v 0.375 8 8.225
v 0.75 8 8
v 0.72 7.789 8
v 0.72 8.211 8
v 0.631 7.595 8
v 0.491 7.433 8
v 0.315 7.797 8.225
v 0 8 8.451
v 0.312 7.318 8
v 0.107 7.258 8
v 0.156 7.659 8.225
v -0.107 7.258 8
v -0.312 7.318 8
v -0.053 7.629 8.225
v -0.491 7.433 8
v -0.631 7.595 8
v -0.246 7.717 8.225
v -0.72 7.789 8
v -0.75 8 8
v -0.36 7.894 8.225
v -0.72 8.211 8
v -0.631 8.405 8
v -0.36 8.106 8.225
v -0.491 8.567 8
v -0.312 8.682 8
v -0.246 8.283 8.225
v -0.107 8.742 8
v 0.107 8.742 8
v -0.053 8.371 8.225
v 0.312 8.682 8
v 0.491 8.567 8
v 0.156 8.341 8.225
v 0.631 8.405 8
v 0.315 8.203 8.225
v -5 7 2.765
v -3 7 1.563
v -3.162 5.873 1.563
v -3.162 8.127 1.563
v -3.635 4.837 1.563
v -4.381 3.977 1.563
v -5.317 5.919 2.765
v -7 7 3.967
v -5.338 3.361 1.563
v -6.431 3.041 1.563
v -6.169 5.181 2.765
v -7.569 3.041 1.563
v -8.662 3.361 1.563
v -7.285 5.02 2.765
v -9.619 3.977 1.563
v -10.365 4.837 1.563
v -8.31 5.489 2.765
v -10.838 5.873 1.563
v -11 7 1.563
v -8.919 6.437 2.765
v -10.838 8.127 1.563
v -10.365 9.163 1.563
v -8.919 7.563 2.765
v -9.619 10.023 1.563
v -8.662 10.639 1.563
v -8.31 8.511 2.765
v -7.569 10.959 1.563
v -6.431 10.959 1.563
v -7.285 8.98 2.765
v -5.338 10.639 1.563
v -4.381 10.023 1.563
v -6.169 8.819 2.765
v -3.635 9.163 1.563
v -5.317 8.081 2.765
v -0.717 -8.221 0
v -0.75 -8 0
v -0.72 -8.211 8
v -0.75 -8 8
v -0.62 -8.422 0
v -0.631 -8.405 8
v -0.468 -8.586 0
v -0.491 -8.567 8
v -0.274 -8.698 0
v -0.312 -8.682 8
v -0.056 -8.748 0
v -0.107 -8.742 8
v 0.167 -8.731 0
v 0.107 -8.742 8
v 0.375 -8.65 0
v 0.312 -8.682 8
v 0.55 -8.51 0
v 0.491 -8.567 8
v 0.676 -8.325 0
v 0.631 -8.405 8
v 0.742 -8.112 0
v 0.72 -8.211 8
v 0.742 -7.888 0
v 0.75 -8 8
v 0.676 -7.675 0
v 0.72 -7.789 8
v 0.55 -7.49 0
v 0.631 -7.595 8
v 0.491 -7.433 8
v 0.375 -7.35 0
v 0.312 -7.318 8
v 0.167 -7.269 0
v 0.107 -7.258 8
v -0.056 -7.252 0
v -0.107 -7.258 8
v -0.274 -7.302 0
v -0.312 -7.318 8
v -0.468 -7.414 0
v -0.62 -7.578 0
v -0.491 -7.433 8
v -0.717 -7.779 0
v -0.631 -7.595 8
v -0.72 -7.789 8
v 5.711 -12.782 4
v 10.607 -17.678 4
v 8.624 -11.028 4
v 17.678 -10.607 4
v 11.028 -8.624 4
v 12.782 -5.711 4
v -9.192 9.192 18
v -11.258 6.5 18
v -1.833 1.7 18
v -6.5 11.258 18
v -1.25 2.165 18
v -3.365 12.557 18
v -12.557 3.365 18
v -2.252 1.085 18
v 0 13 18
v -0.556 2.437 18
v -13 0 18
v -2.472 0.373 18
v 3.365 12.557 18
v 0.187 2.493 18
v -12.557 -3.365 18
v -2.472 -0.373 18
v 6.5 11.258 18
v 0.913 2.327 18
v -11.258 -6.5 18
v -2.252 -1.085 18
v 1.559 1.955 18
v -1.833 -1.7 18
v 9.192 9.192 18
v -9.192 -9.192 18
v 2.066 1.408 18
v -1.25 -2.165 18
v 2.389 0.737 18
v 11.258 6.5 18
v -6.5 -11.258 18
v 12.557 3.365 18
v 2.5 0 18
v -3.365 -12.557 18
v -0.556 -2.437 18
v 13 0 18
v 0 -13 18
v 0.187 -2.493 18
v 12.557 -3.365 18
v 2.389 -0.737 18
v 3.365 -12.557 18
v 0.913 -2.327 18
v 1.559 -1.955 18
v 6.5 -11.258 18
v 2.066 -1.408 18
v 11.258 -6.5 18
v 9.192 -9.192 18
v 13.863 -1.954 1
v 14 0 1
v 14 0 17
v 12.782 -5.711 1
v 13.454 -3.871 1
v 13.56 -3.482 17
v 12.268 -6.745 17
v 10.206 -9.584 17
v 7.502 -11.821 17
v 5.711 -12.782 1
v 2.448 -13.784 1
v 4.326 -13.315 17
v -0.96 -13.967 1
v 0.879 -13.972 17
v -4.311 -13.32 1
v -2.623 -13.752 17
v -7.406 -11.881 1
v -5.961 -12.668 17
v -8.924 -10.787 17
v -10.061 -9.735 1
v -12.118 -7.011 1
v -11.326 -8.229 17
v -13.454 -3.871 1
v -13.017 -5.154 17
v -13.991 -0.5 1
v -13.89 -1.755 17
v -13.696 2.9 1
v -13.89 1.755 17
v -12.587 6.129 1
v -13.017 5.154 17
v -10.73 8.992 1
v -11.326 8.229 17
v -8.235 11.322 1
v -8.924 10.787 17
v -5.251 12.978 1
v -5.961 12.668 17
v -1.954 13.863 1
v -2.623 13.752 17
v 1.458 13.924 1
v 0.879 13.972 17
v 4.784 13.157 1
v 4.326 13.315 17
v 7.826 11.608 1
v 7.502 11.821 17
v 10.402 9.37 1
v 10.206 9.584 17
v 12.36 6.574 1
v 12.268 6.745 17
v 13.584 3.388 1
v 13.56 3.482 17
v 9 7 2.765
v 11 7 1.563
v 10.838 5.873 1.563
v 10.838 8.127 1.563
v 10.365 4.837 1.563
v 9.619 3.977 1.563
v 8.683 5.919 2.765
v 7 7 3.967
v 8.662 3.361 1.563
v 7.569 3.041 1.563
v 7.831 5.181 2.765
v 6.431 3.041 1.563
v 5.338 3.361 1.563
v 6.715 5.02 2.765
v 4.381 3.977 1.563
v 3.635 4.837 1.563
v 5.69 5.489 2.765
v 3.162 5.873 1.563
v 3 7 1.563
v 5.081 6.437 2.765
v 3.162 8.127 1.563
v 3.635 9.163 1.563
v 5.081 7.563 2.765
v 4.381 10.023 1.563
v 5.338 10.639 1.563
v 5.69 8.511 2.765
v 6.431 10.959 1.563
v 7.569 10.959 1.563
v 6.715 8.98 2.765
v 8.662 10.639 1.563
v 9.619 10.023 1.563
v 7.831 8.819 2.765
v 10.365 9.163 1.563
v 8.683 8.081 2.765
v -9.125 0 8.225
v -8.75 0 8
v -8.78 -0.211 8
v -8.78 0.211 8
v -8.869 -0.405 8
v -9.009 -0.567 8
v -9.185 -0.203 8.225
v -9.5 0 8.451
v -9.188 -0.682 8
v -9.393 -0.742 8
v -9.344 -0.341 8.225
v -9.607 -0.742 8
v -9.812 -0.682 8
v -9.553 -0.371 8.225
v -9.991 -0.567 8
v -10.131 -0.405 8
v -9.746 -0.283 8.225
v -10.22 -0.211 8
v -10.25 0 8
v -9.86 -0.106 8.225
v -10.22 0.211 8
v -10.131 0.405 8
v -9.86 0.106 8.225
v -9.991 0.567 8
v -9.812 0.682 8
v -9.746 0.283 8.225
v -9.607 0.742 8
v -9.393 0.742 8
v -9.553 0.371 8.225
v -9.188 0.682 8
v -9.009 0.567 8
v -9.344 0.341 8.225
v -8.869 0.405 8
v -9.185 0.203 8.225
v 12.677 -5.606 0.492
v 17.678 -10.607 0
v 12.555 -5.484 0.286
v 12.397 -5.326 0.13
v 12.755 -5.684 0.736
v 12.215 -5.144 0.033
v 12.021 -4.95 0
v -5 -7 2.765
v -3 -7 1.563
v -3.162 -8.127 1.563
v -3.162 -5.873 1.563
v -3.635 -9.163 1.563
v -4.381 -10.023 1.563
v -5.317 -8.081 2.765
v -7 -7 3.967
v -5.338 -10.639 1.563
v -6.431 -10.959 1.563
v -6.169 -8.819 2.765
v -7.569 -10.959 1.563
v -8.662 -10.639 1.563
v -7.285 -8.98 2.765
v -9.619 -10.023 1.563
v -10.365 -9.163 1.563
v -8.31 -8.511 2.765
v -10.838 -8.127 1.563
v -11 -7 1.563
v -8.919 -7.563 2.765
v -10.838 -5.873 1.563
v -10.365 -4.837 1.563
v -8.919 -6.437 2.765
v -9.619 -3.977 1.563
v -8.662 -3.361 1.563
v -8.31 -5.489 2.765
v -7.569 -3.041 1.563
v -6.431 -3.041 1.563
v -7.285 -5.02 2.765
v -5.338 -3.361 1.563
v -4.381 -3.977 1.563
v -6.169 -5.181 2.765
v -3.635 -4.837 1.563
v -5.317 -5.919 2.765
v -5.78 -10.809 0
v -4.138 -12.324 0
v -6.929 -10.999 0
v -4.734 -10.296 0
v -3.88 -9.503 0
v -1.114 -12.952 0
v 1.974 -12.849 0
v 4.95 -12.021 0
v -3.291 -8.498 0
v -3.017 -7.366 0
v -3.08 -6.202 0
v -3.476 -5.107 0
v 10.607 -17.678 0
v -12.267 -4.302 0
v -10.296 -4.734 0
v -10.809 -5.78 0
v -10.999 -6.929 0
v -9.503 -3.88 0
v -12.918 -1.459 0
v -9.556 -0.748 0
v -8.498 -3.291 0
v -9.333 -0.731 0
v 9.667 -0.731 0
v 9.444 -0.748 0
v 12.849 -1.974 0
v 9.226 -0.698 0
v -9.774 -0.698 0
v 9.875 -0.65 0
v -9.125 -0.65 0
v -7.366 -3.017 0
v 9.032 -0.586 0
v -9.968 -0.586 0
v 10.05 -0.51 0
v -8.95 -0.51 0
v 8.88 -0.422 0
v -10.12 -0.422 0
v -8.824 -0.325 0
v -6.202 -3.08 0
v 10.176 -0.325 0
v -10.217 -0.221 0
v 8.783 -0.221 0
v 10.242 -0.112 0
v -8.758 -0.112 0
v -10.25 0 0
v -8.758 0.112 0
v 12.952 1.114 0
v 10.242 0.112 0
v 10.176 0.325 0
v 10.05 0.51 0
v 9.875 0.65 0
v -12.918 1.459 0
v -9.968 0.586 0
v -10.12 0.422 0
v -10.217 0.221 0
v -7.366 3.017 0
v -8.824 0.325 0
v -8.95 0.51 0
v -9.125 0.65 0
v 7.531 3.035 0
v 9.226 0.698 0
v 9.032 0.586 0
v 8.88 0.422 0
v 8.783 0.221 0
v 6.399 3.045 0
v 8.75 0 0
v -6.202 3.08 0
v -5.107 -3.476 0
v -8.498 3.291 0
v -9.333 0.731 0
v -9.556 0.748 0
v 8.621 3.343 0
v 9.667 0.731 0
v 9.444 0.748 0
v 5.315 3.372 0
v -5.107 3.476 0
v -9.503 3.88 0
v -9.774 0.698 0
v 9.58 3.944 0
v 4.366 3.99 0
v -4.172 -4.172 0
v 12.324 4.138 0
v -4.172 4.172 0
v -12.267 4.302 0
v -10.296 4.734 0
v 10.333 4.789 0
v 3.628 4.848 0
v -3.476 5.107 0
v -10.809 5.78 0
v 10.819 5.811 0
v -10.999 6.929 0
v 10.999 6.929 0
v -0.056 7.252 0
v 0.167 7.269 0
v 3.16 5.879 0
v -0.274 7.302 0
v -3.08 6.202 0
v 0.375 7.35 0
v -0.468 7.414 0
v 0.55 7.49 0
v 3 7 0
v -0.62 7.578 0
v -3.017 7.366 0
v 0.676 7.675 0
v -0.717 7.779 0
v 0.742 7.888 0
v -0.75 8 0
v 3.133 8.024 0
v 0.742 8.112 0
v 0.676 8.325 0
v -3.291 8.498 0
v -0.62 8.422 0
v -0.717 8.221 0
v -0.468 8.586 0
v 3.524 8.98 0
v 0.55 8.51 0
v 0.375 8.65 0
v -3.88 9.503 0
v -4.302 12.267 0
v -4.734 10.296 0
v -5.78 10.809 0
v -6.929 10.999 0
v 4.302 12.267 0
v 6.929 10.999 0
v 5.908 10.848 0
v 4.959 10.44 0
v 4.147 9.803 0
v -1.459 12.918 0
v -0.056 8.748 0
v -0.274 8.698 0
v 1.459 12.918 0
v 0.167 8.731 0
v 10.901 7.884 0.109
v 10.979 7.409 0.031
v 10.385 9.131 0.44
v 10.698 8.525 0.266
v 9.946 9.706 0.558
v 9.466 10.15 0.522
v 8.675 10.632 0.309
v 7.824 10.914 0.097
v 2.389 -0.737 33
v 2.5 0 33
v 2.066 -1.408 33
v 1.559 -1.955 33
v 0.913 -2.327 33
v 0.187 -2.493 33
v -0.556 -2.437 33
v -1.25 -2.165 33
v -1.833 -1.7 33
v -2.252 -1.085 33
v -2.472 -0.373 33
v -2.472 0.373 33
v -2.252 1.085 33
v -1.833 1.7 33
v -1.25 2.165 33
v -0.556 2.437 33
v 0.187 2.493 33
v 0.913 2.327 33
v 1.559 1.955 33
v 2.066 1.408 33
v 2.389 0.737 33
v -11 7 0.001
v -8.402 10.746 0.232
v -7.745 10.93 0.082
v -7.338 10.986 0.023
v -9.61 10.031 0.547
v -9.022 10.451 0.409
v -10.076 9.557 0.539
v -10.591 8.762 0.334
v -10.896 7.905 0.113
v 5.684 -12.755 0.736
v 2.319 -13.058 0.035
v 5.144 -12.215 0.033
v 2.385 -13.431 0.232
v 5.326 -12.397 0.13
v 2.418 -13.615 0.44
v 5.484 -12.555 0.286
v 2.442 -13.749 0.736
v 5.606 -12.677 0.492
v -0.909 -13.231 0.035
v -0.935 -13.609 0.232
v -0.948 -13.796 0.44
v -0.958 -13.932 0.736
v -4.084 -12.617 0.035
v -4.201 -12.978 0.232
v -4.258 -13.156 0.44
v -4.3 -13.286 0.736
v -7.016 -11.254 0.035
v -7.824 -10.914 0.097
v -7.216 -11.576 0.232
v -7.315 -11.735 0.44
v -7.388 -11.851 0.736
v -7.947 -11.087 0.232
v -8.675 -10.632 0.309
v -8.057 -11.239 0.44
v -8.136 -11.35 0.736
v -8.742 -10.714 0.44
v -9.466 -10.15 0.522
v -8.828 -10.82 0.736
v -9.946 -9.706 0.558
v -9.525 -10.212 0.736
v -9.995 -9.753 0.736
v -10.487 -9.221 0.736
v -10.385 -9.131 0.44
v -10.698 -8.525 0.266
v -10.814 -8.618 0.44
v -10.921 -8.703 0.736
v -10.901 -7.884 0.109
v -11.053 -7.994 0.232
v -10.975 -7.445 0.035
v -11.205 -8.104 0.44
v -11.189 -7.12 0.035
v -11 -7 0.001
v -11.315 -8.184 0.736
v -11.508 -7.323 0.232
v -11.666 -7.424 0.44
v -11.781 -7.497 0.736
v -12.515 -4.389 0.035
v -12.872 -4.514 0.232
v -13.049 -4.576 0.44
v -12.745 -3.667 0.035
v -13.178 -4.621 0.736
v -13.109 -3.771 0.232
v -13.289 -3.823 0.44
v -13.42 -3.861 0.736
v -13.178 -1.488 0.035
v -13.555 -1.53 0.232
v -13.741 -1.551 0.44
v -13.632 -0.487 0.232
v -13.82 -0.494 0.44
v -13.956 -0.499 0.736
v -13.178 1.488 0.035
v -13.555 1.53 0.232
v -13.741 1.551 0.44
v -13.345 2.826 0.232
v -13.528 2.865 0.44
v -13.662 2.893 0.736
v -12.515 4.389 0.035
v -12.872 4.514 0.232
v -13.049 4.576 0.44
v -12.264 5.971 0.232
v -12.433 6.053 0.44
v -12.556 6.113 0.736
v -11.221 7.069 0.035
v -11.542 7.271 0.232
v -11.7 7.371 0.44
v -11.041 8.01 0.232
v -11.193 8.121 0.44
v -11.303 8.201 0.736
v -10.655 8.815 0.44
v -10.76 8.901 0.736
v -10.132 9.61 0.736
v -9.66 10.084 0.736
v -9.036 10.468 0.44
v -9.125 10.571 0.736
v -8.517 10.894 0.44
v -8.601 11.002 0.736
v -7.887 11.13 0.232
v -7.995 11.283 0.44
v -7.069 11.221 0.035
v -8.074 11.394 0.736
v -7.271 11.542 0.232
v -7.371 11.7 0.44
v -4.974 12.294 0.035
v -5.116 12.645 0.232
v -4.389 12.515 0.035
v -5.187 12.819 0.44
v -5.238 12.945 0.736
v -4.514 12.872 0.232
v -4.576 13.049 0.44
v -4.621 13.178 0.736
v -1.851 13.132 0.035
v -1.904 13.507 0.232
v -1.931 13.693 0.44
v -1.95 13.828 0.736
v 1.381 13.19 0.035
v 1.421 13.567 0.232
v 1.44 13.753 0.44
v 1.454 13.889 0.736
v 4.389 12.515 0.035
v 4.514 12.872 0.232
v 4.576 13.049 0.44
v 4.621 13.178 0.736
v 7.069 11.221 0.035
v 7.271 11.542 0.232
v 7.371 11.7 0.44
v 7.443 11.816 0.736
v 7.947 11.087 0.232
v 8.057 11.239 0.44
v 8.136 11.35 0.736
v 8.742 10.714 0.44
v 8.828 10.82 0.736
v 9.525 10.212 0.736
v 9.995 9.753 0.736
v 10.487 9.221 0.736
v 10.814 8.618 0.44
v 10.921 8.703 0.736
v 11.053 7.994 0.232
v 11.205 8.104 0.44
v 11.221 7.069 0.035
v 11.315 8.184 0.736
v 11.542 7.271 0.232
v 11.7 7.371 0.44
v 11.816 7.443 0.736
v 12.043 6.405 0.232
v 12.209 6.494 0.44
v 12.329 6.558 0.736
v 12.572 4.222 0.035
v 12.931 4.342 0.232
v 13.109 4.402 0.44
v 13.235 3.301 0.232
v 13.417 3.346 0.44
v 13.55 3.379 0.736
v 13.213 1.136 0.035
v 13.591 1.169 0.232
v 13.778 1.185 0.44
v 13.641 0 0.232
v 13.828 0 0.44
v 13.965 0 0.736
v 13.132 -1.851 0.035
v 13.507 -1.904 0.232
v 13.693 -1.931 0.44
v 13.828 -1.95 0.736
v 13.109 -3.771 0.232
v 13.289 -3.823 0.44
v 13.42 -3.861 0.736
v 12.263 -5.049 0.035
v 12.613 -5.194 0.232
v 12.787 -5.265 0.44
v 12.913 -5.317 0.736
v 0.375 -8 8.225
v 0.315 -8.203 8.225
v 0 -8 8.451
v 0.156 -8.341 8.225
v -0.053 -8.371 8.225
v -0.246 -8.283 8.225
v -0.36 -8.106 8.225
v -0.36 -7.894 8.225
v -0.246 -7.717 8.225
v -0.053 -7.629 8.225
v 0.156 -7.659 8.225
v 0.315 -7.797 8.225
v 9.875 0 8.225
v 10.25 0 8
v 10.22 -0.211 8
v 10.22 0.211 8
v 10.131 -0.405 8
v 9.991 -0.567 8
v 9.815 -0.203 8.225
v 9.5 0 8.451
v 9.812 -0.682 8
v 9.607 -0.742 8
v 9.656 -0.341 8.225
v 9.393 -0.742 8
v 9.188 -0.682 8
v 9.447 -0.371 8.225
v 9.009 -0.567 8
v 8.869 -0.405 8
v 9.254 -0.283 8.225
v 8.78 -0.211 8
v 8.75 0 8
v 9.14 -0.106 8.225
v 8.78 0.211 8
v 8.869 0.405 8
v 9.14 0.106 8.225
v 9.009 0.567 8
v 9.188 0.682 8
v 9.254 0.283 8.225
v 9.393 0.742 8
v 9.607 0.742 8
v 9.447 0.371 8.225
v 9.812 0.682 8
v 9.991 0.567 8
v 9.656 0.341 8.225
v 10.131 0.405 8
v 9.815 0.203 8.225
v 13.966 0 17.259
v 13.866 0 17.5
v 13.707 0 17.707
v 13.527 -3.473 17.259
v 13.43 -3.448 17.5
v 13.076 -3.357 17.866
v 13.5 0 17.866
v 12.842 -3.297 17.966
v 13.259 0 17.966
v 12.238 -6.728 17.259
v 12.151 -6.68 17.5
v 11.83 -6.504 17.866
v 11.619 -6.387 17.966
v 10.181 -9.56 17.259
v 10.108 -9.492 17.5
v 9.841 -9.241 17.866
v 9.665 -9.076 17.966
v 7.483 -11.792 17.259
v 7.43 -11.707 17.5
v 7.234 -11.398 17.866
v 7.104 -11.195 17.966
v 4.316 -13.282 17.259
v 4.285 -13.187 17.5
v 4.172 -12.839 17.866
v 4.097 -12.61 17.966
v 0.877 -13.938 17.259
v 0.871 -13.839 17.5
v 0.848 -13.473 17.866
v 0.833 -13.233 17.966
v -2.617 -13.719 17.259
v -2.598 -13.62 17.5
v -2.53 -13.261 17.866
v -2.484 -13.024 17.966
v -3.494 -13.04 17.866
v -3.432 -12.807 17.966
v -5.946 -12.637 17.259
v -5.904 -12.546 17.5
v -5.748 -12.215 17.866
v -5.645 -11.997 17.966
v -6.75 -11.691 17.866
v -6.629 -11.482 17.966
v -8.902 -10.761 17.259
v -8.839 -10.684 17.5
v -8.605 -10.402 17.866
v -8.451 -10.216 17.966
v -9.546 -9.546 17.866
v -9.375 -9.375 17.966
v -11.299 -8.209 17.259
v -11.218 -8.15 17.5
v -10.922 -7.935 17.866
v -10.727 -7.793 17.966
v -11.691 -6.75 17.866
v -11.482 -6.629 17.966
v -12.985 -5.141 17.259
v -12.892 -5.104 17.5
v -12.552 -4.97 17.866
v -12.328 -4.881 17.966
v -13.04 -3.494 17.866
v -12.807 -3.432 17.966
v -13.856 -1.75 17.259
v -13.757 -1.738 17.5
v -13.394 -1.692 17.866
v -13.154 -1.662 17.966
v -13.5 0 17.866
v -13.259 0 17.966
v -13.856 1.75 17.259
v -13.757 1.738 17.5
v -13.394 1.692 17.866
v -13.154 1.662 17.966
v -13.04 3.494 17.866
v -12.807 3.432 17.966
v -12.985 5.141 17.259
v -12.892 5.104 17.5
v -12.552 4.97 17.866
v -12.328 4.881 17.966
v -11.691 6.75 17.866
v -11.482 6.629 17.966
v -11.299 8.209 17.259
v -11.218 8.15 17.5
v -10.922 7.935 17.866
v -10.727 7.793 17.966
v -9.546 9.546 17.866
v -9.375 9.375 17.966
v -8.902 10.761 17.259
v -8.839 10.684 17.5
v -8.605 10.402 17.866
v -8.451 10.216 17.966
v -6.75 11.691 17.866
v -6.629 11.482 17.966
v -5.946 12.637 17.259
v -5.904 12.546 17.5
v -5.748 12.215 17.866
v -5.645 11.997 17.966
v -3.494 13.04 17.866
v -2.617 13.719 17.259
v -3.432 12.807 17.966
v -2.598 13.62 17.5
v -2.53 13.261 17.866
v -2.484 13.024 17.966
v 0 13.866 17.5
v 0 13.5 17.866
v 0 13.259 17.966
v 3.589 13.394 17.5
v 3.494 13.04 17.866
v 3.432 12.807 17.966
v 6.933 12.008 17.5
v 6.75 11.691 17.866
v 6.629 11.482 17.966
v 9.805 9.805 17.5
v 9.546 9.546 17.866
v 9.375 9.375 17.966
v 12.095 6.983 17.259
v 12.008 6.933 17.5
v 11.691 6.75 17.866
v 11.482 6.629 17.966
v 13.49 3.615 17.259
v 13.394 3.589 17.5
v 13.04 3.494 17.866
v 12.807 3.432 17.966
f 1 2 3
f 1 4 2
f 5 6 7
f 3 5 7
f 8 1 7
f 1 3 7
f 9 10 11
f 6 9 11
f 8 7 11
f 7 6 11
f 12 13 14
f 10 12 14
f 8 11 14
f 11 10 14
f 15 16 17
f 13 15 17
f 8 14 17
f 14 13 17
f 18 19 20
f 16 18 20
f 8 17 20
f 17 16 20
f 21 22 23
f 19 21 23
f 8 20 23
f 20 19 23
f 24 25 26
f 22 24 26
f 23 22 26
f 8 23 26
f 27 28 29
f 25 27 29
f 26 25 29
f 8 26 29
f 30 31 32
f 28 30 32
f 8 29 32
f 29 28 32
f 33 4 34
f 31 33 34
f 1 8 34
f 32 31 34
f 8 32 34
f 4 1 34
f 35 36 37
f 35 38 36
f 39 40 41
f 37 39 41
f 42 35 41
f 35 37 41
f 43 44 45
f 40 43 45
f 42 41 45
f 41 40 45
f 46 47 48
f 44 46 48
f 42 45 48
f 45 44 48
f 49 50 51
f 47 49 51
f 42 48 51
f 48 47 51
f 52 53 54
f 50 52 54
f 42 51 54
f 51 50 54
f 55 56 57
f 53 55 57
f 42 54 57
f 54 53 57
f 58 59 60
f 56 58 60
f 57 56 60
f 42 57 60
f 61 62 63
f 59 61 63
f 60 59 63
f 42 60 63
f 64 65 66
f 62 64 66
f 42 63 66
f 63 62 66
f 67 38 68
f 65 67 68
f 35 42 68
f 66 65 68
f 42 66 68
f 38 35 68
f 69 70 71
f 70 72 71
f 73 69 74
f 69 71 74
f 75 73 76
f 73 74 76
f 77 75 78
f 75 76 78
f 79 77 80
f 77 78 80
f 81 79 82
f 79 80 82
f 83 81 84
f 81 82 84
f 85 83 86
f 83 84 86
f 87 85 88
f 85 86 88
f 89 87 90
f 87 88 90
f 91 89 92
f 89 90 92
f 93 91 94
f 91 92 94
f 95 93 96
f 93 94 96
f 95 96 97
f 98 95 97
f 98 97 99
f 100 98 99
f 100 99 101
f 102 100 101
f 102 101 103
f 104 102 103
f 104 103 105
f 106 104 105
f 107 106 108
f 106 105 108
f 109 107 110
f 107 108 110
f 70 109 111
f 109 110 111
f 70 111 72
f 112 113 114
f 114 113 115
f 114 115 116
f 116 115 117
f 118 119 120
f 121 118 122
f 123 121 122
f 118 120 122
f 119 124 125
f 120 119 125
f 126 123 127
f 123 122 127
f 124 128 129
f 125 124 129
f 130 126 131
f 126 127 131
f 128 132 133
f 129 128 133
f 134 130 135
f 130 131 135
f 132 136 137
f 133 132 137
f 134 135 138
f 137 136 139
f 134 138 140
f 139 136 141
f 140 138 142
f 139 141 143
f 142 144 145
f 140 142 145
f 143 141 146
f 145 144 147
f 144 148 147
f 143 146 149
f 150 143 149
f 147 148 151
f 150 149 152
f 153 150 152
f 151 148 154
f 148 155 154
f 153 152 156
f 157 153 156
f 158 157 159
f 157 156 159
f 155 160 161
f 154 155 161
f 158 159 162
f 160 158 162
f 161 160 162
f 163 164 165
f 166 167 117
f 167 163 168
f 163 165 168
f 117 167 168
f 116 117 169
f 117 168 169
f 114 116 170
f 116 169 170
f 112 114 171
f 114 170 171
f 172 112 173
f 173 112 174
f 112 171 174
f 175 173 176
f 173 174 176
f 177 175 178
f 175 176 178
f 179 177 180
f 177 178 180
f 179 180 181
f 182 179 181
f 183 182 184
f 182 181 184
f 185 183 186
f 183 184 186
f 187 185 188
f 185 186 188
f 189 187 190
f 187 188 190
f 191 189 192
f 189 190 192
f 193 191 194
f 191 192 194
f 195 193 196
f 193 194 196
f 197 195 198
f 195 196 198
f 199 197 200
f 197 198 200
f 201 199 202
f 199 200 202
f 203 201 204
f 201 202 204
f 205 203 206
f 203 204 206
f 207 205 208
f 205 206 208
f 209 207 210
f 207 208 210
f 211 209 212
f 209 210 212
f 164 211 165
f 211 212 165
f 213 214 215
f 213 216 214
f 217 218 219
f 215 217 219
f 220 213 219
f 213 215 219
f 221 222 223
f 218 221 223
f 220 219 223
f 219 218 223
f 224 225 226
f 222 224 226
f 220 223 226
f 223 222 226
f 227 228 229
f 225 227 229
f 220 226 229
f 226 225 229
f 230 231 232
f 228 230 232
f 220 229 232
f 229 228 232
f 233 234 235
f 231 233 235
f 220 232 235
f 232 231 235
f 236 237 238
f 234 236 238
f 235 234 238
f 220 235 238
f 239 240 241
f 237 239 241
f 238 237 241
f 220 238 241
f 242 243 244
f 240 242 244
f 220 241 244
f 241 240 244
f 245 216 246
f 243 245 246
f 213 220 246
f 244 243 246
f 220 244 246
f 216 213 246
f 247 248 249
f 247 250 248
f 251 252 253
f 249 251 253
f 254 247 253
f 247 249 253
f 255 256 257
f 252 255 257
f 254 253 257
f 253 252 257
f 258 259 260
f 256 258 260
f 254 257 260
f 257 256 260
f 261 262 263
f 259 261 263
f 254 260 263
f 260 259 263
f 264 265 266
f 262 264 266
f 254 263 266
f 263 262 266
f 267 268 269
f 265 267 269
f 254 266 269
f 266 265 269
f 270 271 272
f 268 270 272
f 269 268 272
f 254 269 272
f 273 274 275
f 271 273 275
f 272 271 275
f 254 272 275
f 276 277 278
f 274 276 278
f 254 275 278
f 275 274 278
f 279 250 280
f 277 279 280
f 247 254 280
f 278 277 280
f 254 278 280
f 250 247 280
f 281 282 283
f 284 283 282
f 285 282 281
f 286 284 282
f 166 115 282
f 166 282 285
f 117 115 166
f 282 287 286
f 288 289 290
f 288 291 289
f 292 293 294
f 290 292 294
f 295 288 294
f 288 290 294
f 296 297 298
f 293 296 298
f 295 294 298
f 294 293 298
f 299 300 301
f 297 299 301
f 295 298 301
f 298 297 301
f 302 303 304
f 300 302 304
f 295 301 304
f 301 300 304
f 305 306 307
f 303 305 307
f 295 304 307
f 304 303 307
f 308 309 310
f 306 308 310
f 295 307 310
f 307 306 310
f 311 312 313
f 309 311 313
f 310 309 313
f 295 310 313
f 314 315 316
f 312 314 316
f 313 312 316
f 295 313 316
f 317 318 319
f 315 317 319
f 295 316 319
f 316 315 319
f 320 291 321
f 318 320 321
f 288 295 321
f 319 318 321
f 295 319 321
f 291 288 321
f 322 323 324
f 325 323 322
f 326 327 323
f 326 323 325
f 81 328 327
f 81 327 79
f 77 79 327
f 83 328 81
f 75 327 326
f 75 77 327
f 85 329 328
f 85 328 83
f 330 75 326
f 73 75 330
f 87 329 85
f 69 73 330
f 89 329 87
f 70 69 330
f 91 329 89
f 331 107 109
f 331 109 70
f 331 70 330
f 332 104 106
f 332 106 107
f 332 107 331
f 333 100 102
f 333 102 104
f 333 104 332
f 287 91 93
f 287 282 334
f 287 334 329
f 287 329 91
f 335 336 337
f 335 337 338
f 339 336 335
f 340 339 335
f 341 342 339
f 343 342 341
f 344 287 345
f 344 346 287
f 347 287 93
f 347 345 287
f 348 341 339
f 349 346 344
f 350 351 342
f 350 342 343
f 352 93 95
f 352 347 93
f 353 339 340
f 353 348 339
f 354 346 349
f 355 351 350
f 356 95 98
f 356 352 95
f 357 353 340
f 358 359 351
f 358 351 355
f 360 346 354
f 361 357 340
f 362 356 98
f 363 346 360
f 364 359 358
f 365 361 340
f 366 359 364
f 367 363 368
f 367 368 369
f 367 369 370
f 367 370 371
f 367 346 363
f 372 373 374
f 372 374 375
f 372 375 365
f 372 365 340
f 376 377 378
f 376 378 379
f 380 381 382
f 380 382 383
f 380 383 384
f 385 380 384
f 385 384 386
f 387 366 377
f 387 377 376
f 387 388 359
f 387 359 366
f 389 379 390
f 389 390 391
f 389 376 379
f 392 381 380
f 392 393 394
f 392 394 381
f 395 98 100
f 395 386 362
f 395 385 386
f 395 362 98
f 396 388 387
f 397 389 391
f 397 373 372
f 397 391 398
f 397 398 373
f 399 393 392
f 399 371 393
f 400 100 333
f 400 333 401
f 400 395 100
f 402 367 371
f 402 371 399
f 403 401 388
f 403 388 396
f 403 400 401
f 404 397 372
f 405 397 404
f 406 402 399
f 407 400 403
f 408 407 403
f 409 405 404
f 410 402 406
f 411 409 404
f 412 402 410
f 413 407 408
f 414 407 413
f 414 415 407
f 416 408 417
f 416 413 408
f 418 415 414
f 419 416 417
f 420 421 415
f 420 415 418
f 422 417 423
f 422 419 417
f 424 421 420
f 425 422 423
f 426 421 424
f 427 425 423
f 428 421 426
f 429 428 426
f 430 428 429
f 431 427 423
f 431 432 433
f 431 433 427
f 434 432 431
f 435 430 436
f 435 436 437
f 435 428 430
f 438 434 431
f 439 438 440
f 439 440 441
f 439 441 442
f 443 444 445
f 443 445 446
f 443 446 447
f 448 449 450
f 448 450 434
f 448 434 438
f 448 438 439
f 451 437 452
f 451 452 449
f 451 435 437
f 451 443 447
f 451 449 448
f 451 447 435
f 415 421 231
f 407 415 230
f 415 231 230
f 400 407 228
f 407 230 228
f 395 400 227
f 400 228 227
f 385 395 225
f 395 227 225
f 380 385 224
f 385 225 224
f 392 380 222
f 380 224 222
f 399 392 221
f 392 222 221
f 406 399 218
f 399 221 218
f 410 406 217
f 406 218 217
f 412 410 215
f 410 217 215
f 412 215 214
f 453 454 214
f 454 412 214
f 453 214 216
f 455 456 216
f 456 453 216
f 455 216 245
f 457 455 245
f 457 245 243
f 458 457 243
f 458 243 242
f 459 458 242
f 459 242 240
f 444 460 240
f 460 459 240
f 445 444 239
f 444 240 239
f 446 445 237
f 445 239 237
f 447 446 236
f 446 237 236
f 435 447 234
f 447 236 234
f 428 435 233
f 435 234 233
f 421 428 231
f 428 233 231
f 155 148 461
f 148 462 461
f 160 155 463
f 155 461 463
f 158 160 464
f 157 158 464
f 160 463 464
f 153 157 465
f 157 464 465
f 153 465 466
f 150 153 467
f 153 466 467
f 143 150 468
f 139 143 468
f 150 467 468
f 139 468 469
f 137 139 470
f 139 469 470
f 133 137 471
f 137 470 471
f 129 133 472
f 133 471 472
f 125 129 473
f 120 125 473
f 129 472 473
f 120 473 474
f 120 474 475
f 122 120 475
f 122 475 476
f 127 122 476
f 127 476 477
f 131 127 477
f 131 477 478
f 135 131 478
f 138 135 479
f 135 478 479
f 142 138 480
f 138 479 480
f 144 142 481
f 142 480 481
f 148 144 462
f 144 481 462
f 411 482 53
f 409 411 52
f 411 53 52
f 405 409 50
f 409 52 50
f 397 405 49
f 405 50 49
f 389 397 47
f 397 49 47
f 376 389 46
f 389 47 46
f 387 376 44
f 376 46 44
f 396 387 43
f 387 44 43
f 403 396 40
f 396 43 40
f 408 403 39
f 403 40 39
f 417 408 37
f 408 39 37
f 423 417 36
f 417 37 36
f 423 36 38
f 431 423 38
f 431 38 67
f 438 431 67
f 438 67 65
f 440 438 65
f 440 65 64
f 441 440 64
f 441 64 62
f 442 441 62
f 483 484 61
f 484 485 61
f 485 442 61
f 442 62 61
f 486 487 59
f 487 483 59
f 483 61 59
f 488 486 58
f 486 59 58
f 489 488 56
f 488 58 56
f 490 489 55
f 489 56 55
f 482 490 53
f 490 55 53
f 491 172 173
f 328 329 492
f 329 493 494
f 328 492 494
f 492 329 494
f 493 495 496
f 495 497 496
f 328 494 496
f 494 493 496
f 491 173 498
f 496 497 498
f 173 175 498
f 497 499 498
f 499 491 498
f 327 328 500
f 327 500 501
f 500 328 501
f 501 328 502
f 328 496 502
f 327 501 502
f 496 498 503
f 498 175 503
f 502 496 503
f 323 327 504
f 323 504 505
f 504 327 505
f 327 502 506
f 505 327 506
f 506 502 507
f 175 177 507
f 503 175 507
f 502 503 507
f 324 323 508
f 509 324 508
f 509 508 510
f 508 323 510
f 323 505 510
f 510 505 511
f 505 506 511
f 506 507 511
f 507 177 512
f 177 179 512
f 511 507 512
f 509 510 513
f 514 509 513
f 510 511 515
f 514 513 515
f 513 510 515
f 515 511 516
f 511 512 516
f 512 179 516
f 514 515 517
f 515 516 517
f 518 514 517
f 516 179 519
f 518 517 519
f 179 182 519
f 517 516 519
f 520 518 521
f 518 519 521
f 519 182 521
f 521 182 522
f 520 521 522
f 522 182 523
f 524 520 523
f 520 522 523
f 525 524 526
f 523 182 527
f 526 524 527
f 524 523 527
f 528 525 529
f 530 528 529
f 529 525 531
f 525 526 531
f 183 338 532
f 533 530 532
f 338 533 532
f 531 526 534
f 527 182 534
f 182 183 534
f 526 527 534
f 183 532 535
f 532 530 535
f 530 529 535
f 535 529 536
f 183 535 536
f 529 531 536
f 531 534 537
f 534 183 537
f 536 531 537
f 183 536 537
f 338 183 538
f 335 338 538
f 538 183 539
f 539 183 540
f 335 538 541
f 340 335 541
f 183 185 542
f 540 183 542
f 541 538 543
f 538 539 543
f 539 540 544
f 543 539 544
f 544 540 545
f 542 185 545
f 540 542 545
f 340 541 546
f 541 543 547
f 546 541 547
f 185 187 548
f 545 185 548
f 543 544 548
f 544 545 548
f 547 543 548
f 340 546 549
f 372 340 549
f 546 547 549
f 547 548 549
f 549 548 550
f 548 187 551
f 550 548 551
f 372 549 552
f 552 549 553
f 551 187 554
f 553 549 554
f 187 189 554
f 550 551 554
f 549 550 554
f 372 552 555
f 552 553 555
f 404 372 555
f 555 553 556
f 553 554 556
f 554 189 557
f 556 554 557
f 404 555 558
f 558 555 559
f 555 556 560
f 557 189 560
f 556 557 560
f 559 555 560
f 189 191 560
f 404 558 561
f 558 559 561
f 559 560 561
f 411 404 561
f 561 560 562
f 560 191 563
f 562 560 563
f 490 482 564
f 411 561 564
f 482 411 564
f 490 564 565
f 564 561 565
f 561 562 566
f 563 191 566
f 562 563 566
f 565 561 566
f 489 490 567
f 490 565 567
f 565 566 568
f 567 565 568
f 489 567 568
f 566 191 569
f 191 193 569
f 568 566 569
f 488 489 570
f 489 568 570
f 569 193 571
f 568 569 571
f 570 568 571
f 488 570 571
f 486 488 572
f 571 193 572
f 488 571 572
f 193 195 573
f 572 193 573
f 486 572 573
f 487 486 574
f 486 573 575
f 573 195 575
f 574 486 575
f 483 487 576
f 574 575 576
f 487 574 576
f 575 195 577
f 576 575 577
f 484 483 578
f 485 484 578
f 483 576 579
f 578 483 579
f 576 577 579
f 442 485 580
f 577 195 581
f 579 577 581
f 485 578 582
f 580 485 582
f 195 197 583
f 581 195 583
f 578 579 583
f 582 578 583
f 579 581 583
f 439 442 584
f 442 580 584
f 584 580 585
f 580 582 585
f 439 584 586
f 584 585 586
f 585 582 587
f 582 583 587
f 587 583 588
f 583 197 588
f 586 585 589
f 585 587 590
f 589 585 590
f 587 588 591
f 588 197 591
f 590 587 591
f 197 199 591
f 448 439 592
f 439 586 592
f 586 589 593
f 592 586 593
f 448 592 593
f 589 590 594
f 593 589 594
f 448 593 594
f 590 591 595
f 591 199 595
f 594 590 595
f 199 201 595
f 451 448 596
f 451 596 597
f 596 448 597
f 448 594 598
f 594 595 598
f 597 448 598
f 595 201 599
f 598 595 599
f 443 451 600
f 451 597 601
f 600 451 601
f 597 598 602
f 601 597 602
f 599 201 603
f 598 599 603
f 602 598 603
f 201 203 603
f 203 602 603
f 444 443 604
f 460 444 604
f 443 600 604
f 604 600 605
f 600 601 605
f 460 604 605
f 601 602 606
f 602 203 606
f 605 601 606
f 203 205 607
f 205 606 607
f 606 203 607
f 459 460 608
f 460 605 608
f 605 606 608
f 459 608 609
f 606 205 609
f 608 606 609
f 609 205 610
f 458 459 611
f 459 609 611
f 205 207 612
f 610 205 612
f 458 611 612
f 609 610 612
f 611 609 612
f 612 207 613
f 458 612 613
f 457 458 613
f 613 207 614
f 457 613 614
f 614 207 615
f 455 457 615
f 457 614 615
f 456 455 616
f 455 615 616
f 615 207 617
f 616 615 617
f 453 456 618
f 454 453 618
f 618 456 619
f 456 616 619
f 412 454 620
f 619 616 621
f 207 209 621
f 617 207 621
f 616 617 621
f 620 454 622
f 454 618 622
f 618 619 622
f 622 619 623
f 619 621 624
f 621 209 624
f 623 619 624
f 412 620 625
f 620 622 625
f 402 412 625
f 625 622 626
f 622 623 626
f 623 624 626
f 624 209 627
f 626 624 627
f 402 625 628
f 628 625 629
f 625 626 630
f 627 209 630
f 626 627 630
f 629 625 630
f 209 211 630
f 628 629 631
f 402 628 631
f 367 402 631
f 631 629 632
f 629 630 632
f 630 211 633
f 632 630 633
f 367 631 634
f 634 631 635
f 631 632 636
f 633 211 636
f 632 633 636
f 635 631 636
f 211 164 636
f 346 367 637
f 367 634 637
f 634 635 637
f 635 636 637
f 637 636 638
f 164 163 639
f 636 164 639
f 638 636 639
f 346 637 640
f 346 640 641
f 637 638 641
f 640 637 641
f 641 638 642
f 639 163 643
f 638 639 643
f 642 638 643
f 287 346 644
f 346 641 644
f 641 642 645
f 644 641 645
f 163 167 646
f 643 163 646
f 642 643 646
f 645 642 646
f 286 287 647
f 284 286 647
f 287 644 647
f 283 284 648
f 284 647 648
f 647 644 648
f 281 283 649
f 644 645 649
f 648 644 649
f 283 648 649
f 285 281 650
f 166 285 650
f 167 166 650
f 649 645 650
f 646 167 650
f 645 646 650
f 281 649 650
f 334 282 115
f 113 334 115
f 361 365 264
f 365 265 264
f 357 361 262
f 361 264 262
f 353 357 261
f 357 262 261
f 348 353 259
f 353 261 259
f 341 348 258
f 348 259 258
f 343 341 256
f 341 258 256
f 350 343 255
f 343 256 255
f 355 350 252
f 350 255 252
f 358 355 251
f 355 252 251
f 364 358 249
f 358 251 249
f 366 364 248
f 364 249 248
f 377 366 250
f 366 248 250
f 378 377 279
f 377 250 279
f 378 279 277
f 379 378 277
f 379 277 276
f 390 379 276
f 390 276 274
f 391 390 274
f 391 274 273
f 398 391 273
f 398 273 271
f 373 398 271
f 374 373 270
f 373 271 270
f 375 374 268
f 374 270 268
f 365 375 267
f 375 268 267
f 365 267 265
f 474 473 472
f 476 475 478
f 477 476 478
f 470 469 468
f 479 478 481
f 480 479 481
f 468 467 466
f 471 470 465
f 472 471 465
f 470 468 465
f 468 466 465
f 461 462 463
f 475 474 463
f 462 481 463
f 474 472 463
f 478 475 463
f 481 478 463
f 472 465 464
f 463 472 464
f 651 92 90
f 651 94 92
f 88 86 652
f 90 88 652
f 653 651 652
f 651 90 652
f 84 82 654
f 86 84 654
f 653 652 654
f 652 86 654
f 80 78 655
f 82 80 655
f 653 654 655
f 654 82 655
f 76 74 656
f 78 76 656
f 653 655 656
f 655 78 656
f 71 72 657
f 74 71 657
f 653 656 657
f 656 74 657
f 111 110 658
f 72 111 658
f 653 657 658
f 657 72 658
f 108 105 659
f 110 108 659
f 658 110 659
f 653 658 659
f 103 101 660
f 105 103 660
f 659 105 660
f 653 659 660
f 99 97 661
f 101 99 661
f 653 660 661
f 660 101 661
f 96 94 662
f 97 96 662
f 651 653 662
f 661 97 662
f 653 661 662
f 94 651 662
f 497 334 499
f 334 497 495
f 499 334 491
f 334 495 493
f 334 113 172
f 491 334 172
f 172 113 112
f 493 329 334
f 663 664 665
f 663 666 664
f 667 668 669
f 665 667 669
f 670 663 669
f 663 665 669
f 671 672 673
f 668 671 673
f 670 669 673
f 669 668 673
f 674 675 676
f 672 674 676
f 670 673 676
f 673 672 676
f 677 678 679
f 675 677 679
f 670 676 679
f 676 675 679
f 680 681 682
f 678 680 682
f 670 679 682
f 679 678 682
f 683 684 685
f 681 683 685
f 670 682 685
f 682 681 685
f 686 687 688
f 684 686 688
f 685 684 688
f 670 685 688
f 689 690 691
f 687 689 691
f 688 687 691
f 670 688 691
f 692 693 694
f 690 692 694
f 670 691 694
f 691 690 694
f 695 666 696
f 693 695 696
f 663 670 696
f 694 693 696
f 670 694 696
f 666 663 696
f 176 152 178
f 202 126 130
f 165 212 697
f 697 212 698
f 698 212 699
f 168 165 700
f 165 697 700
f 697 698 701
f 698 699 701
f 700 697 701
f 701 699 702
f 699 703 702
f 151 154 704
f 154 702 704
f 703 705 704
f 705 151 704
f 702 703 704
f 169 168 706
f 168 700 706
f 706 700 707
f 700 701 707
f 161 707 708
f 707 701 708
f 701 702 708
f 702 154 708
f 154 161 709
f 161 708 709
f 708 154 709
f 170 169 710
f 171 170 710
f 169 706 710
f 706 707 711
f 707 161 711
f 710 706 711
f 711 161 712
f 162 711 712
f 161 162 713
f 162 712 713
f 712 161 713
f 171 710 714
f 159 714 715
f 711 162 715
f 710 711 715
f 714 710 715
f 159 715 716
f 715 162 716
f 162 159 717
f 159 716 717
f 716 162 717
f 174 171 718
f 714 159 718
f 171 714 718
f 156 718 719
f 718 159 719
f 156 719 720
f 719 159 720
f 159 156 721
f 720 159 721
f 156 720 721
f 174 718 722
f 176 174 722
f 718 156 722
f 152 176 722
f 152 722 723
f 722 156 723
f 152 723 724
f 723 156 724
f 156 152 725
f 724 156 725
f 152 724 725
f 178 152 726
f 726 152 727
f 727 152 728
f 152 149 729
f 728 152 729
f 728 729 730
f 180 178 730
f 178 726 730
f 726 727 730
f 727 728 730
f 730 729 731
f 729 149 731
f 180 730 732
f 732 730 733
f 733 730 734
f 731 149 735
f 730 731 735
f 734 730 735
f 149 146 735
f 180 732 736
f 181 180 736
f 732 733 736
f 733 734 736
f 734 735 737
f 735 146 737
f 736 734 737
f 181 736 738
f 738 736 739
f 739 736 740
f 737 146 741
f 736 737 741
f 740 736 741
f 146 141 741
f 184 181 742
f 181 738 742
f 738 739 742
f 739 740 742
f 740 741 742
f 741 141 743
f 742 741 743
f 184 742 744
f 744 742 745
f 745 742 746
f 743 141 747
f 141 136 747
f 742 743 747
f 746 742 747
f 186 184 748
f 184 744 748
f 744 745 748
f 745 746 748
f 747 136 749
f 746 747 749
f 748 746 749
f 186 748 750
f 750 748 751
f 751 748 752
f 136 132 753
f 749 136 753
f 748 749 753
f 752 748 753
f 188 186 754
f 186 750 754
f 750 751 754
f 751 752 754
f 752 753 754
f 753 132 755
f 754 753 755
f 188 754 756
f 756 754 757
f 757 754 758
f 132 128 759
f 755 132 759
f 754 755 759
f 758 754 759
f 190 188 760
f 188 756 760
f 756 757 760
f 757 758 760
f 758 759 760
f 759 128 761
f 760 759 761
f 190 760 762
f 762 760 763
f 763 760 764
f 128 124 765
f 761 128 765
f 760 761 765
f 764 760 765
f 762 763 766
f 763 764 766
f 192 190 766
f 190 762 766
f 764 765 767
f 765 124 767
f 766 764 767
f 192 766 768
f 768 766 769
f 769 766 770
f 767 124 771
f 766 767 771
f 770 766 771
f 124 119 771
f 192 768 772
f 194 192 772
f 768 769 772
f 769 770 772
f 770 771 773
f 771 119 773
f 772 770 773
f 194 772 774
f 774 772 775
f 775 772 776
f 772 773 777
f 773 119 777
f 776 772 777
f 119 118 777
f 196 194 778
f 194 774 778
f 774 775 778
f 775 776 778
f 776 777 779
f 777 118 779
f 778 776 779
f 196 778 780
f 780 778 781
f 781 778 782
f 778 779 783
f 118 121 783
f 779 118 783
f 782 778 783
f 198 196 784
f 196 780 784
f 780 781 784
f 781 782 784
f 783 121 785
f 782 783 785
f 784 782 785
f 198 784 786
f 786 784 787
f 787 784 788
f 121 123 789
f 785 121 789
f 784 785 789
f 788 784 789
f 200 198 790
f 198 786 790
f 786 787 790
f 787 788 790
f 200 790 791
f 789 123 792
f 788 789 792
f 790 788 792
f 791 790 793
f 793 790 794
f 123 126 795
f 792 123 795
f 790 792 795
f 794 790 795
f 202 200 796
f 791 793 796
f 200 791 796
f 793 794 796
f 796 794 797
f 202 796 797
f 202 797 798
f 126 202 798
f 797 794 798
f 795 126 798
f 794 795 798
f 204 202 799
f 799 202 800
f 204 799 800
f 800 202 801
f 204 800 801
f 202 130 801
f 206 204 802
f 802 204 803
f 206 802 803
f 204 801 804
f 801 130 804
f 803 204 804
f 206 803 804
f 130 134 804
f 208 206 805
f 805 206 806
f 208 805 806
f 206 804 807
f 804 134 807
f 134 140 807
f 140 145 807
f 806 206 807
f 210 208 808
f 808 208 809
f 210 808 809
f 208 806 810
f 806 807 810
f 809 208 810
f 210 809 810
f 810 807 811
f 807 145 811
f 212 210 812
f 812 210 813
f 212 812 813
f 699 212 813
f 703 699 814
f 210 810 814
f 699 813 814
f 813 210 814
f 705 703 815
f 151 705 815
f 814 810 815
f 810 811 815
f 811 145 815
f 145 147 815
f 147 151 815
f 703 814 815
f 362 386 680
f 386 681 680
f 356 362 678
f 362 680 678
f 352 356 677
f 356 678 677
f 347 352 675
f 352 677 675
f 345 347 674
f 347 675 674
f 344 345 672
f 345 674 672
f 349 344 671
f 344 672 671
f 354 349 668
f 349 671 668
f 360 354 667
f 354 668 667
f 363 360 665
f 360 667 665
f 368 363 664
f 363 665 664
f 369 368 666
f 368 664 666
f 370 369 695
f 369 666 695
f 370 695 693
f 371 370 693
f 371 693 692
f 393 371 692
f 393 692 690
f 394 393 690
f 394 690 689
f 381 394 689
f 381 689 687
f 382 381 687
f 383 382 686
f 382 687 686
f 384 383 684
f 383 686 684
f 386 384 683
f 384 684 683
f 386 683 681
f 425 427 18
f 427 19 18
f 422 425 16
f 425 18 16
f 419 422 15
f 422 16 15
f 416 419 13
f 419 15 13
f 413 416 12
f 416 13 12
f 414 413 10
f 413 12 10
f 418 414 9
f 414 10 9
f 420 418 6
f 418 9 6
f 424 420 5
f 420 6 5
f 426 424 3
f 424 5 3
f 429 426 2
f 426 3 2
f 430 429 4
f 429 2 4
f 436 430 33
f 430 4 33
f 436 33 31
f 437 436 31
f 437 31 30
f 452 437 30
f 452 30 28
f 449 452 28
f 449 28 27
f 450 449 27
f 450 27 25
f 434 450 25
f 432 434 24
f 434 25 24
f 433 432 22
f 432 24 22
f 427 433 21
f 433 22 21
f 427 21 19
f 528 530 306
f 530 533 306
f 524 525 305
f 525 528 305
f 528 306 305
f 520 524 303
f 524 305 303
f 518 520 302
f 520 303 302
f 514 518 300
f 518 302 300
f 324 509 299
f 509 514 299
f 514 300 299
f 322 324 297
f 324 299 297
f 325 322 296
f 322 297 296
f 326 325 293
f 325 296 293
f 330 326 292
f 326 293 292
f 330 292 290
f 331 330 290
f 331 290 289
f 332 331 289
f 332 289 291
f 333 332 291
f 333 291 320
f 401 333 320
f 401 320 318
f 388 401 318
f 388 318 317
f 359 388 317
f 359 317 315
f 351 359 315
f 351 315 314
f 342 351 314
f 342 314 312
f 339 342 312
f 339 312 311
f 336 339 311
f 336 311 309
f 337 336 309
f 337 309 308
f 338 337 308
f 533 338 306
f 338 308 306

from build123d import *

# Parameters (mm, degrees)
F3_D      = 1.5
F3_DEPTH  = 8
F3_TIP    = 0.4506454643
F7_W      = 9
F7_H      = 4
F8_DEPTH  = 5
F10_D     = 8
F10_DEPTH = 1
F10_START = 0.5630689
F10_TIP   = 2.4034424761


with BuildPart() as f1:
    # F0 (on Front) → F1 (revolve)
    with BuildSketch(Plane.XZ):
        with BuildLine():
            Line((0, 33), (0, 0))
            Line((0, 0), (13, 0))
            ThreePointArc((13, 0), (13.7071067812, 0.2928932188), (14, 1))
            Line((14, 1), (14, 17))
            ThreePointArc((14, 17), (13.7071067812, 17.7071067812), (13, 18))
            Line((13, 18), (2.5, 18))
            Line((2.5, 18), (2.5, 33))
            Line((2.5, 33), (0, 33))
        make_face()
    revolve(axis=Axis((0, 0, 16.5), (0, 0, -1)))

    # F3
    with Locations(Plane(origin=(0, 0, 0), x_dir=(1, 0, 0), z_dir=(0, 0, -1))):
        with Locations((0, 8), (-9.5, 0), (0, -8), (9.5, 0)):
            Hole(F3_D / 2, depth=F3_DEPTH)
            with Locations((0, 0, -(F3_DEPTH + F3_TIP / 2))):  # 118° drill point
                Cone(0, F3_D / 2, F3_TIP, mode=Mode.SUBTRACT)

    # F7 (on 3pt) → F8 (join, symmetric)
    with BuildSketch(Plane(origin=(0, 0, 0), x_dir=(-0.7071067812, 0.7071067812, 0), z_dir=(0.7071067812, 0.7071067812, 0))):
        with Locations((-15.5, 2)):
            Rectangle(F7_W, F7_H)
    extrude(amount=F8_DEPTH, both=True)

    # F10
    # its depths count from where the whole tool has entered the part; down to there all is cleared
    with Locations(Plane(origin=(0, 0, 0), x_dir=(1, 0, 0), z_dir=(0, 0, -1)).offset(-F10_START)):
        with Locations((-7, 7), (-7, -7), (7, -7)):
            Hole(F10_D / 2, depth=F10_DEPTH)
            with Locations((0, 0, -(F10_DEPTH + F10_TIP / 2))):  # 118° drill point
                Cone(0, F10_D / 2, F10_TIP, mode=Mode.SUBTRACT)


solid = f1.part
